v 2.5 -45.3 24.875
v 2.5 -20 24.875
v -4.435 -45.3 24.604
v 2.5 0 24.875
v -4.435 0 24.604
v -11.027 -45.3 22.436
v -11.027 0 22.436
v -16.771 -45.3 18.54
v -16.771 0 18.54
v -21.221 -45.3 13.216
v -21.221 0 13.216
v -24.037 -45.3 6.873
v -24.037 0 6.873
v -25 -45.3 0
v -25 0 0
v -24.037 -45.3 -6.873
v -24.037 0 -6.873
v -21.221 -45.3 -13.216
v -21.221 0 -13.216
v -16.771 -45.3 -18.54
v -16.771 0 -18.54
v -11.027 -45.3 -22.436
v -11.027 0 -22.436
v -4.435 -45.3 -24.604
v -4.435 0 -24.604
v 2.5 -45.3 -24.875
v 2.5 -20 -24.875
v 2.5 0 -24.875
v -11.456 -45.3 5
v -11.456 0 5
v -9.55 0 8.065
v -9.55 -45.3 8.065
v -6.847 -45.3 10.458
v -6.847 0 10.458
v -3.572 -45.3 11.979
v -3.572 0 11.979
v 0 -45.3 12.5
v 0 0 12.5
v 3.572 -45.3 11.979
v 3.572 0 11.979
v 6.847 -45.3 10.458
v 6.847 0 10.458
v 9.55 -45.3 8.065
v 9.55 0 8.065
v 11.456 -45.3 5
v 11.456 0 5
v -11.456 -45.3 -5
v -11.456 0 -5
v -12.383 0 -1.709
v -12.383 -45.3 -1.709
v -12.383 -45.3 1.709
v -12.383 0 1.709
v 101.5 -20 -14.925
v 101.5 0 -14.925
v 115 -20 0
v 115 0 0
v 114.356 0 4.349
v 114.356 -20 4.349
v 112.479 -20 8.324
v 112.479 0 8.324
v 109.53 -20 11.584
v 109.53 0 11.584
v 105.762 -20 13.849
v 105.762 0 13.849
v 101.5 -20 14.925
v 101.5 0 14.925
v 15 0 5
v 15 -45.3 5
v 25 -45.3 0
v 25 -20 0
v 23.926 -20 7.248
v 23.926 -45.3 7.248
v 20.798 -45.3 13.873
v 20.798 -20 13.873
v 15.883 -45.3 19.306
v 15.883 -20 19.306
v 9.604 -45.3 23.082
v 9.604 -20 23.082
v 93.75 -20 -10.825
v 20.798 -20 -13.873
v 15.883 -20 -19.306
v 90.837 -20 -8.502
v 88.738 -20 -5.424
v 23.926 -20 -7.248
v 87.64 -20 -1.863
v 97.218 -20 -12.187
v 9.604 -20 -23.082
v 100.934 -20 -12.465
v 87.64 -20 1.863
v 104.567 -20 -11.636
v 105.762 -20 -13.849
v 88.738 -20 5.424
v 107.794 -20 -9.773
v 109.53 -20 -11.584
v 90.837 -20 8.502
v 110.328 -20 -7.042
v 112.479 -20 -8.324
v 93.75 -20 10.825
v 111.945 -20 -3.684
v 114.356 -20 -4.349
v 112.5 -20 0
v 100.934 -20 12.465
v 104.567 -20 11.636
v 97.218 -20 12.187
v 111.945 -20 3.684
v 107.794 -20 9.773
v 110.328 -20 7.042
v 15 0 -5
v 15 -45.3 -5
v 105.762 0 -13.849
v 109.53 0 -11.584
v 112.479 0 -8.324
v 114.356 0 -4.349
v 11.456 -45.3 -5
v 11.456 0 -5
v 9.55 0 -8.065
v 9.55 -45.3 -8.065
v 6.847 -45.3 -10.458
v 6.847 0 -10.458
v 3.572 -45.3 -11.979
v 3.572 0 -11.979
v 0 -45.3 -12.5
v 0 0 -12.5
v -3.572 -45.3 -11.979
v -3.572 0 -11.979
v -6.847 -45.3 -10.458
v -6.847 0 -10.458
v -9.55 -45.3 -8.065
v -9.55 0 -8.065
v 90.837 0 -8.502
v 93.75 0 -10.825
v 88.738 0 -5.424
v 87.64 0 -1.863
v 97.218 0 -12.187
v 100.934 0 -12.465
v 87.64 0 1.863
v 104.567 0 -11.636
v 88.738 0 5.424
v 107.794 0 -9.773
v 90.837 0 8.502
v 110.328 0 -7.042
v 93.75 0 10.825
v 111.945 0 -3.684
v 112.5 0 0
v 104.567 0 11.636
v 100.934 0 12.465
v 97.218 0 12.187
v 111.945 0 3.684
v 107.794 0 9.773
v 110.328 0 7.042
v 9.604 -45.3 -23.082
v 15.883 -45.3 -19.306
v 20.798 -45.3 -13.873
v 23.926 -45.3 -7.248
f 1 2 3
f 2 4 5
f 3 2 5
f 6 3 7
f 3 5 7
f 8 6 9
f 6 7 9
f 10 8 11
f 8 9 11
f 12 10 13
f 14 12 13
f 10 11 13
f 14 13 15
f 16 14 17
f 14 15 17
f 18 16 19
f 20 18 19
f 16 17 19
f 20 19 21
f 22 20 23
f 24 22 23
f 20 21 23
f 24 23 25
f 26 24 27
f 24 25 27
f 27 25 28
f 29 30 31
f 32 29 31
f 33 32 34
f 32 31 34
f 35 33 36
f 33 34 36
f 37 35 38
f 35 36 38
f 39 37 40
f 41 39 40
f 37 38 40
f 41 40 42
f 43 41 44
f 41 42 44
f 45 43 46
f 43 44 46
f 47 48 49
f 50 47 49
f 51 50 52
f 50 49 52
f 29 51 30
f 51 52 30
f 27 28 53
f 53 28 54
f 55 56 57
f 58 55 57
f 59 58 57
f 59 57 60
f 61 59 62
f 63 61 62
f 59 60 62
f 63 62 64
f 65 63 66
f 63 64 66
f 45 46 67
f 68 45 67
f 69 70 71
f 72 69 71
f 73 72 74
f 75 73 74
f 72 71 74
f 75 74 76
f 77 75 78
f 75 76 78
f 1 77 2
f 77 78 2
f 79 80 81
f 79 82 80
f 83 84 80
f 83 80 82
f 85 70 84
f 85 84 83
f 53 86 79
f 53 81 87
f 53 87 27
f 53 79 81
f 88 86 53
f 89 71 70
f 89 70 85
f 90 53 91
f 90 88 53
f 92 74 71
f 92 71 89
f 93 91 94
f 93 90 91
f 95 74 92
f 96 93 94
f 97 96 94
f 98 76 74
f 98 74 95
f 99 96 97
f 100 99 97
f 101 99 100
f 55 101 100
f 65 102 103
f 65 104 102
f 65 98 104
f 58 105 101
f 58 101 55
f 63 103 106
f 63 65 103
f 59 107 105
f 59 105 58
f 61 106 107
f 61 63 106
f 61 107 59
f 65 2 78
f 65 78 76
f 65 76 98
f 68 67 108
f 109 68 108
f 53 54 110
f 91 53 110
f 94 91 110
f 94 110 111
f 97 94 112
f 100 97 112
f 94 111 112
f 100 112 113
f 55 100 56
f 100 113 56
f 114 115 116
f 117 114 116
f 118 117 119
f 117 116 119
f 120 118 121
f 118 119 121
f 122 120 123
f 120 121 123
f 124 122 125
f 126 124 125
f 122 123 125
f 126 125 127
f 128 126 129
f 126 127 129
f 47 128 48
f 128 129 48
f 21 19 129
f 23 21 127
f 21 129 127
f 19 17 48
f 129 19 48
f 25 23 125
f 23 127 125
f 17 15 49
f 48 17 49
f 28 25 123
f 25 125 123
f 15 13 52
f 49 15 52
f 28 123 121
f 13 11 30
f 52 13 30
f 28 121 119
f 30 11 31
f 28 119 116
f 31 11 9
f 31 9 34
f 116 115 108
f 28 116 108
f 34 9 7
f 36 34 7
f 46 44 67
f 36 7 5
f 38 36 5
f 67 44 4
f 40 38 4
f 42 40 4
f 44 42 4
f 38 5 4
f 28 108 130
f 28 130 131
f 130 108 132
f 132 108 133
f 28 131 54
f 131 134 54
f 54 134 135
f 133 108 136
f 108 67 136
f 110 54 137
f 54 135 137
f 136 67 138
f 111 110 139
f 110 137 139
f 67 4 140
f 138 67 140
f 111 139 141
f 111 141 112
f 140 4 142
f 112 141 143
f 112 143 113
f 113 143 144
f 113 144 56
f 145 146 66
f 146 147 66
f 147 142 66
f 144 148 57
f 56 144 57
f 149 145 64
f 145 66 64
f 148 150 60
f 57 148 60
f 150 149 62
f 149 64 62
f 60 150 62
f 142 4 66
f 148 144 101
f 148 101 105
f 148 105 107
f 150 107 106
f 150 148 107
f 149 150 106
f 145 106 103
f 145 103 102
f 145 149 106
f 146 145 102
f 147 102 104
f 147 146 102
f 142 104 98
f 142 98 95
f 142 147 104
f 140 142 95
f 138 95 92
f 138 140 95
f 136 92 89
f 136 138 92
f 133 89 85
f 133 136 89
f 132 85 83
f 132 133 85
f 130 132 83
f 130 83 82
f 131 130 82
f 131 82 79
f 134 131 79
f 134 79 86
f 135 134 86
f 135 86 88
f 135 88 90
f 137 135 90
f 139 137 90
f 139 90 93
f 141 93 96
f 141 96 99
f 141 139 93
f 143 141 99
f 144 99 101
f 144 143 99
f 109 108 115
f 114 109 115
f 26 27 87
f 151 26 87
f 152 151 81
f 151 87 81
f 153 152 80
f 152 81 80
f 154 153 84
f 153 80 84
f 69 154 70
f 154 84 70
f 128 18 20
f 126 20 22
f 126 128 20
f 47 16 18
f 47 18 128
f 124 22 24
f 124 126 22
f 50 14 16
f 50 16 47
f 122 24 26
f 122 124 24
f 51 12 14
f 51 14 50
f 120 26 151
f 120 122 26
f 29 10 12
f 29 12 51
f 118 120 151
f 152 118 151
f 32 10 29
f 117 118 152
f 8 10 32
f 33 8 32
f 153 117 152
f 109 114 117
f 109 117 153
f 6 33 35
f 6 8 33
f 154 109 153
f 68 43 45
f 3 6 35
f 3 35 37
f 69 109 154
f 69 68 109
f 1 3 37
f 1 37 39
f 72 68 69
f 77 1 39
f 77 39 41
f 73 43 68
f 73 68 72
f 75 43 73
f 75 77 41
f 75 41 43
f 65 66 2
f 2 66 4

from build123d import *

# Parameters (mm, degrees)
F0_R     = 12.5
F1_DEPTH = 20
F2_DEPTH = 45.3


with BuildPart() as f1:
    # F0 (on Front) → F1 (new body)
    with BuildSketch(Plane.XZ):
        with BuildLine():
            ThreePointArc((2.5, 24.874686), (18.540496, 16.77051), (25, 0))
            ThreePointArc((25, 0), (18.540496, -16.77051), (2.5, -24.874686))
            Line((2.5, -24.874686), (101.5, -14.924812))
            ThreePointArc((101.5, -14.924812), (85, 0), (101.5, 14.924812))
            Line((101.5, 14.924812), (2.5, 24.874686))
        make_face()
        with BuildLine():
            ThreePointArc((2.5, -24.874686), (18.540496, -16.77051), (25, 0))
            ThreePointArc((25, 0), (18.540496, 16.77051), (2.5, 24.874686))
            ThreePointArc((2.5, 24.874686), (-25, 0), (2.5, -24.874686))
        make_face()
        with BuildLine():
            ThreePointArc((-11.456439, 5), (0, 12.5), (11.456439, 5))
            Line((11.456439, 5), (15, 5))
            Line((15, 5), (15, -5))
            Line((15, -5), (11.456439, -5))
            ThreePointArc((11.456439, -5), (0, -12.5), (-11.456439, -5))
            Line((-11.456439, -5), (-15, -5))
            Line((-15, -5), (-15, 5))
            Line((-15, 5), (-11.456439, 5))
        make_face(mode=Mode.SUBTRACT)
        with BuildLine():
            ThreePointArc((115, 0), (111.124298, 10.062306), (101.5, 14.924812))
            ThreePointArc((101.5, 14.924812), (85, 0), (101.5, -14.924812))
            ThreePointArc((101.5, -14.924812), (111.124298, -10.062306), (115, 0))
        make_face()
        with Locations((100, 0)):
            Circle(F0_R, mode=Mode.SUBTRACT)
        with BuildLine():
            ThreePointArc((-11.456439, -5), (-12.5, 0), (-11.456439, 5))
            Line((-11.456439, 5), (-15, 5))
            Line((-15, 5), (-15, -5))
            Line((-15, -5), (-11.456439, -5))
        make_face()
    extrude(amount=F1_DEPTH)

    # F0 (on Front) → F2 (join)
    with BuildSketch(Plane.XZ):
        with BuildLine():
            ThreePointArc((2.5, -24.874686), (18.540496, -16.77051), (25, 0))
            ThreePointArc((25, 0), (18.540496, 16.77051), (2.5, 24.874686))
            ThreePointArc((2.5, 24.874686), (-25, 0), (2.5, -24.874686))
        make_face()
        with BuildLine():
            ThreePointArc((-11.456439, 5), (0, 12.5), (11.456439, 5))
            Line((11.456439, 5), (15, 5))
            Line((15, 5), (15, -5))
            Line((15, -5), (11.456439, -5))
            ThreePointArc((11.456439, -5), (0, -12.5), (-11.456439, -5))
            Line((-11.456439, -5), (-15, -5))
            Line((-15, -5), (-15, 5))
            Line((-15, 5), (-11.456439, 5))
        make_face(mode=Mode.SUBTRACT)
        with BuildLine():
            ThreePointArc((-11.456439, -5), (-12.5, 0), (-11.456439, 5))
            Line((-11.456439, 5), (-15, 5))
            Line((-15, 5), (-15, -5))
            Line((-15, -5), (-11.456439, -5))
        make_face()
    extrude(amount=F2_DEPTH)


solid = f1.part
